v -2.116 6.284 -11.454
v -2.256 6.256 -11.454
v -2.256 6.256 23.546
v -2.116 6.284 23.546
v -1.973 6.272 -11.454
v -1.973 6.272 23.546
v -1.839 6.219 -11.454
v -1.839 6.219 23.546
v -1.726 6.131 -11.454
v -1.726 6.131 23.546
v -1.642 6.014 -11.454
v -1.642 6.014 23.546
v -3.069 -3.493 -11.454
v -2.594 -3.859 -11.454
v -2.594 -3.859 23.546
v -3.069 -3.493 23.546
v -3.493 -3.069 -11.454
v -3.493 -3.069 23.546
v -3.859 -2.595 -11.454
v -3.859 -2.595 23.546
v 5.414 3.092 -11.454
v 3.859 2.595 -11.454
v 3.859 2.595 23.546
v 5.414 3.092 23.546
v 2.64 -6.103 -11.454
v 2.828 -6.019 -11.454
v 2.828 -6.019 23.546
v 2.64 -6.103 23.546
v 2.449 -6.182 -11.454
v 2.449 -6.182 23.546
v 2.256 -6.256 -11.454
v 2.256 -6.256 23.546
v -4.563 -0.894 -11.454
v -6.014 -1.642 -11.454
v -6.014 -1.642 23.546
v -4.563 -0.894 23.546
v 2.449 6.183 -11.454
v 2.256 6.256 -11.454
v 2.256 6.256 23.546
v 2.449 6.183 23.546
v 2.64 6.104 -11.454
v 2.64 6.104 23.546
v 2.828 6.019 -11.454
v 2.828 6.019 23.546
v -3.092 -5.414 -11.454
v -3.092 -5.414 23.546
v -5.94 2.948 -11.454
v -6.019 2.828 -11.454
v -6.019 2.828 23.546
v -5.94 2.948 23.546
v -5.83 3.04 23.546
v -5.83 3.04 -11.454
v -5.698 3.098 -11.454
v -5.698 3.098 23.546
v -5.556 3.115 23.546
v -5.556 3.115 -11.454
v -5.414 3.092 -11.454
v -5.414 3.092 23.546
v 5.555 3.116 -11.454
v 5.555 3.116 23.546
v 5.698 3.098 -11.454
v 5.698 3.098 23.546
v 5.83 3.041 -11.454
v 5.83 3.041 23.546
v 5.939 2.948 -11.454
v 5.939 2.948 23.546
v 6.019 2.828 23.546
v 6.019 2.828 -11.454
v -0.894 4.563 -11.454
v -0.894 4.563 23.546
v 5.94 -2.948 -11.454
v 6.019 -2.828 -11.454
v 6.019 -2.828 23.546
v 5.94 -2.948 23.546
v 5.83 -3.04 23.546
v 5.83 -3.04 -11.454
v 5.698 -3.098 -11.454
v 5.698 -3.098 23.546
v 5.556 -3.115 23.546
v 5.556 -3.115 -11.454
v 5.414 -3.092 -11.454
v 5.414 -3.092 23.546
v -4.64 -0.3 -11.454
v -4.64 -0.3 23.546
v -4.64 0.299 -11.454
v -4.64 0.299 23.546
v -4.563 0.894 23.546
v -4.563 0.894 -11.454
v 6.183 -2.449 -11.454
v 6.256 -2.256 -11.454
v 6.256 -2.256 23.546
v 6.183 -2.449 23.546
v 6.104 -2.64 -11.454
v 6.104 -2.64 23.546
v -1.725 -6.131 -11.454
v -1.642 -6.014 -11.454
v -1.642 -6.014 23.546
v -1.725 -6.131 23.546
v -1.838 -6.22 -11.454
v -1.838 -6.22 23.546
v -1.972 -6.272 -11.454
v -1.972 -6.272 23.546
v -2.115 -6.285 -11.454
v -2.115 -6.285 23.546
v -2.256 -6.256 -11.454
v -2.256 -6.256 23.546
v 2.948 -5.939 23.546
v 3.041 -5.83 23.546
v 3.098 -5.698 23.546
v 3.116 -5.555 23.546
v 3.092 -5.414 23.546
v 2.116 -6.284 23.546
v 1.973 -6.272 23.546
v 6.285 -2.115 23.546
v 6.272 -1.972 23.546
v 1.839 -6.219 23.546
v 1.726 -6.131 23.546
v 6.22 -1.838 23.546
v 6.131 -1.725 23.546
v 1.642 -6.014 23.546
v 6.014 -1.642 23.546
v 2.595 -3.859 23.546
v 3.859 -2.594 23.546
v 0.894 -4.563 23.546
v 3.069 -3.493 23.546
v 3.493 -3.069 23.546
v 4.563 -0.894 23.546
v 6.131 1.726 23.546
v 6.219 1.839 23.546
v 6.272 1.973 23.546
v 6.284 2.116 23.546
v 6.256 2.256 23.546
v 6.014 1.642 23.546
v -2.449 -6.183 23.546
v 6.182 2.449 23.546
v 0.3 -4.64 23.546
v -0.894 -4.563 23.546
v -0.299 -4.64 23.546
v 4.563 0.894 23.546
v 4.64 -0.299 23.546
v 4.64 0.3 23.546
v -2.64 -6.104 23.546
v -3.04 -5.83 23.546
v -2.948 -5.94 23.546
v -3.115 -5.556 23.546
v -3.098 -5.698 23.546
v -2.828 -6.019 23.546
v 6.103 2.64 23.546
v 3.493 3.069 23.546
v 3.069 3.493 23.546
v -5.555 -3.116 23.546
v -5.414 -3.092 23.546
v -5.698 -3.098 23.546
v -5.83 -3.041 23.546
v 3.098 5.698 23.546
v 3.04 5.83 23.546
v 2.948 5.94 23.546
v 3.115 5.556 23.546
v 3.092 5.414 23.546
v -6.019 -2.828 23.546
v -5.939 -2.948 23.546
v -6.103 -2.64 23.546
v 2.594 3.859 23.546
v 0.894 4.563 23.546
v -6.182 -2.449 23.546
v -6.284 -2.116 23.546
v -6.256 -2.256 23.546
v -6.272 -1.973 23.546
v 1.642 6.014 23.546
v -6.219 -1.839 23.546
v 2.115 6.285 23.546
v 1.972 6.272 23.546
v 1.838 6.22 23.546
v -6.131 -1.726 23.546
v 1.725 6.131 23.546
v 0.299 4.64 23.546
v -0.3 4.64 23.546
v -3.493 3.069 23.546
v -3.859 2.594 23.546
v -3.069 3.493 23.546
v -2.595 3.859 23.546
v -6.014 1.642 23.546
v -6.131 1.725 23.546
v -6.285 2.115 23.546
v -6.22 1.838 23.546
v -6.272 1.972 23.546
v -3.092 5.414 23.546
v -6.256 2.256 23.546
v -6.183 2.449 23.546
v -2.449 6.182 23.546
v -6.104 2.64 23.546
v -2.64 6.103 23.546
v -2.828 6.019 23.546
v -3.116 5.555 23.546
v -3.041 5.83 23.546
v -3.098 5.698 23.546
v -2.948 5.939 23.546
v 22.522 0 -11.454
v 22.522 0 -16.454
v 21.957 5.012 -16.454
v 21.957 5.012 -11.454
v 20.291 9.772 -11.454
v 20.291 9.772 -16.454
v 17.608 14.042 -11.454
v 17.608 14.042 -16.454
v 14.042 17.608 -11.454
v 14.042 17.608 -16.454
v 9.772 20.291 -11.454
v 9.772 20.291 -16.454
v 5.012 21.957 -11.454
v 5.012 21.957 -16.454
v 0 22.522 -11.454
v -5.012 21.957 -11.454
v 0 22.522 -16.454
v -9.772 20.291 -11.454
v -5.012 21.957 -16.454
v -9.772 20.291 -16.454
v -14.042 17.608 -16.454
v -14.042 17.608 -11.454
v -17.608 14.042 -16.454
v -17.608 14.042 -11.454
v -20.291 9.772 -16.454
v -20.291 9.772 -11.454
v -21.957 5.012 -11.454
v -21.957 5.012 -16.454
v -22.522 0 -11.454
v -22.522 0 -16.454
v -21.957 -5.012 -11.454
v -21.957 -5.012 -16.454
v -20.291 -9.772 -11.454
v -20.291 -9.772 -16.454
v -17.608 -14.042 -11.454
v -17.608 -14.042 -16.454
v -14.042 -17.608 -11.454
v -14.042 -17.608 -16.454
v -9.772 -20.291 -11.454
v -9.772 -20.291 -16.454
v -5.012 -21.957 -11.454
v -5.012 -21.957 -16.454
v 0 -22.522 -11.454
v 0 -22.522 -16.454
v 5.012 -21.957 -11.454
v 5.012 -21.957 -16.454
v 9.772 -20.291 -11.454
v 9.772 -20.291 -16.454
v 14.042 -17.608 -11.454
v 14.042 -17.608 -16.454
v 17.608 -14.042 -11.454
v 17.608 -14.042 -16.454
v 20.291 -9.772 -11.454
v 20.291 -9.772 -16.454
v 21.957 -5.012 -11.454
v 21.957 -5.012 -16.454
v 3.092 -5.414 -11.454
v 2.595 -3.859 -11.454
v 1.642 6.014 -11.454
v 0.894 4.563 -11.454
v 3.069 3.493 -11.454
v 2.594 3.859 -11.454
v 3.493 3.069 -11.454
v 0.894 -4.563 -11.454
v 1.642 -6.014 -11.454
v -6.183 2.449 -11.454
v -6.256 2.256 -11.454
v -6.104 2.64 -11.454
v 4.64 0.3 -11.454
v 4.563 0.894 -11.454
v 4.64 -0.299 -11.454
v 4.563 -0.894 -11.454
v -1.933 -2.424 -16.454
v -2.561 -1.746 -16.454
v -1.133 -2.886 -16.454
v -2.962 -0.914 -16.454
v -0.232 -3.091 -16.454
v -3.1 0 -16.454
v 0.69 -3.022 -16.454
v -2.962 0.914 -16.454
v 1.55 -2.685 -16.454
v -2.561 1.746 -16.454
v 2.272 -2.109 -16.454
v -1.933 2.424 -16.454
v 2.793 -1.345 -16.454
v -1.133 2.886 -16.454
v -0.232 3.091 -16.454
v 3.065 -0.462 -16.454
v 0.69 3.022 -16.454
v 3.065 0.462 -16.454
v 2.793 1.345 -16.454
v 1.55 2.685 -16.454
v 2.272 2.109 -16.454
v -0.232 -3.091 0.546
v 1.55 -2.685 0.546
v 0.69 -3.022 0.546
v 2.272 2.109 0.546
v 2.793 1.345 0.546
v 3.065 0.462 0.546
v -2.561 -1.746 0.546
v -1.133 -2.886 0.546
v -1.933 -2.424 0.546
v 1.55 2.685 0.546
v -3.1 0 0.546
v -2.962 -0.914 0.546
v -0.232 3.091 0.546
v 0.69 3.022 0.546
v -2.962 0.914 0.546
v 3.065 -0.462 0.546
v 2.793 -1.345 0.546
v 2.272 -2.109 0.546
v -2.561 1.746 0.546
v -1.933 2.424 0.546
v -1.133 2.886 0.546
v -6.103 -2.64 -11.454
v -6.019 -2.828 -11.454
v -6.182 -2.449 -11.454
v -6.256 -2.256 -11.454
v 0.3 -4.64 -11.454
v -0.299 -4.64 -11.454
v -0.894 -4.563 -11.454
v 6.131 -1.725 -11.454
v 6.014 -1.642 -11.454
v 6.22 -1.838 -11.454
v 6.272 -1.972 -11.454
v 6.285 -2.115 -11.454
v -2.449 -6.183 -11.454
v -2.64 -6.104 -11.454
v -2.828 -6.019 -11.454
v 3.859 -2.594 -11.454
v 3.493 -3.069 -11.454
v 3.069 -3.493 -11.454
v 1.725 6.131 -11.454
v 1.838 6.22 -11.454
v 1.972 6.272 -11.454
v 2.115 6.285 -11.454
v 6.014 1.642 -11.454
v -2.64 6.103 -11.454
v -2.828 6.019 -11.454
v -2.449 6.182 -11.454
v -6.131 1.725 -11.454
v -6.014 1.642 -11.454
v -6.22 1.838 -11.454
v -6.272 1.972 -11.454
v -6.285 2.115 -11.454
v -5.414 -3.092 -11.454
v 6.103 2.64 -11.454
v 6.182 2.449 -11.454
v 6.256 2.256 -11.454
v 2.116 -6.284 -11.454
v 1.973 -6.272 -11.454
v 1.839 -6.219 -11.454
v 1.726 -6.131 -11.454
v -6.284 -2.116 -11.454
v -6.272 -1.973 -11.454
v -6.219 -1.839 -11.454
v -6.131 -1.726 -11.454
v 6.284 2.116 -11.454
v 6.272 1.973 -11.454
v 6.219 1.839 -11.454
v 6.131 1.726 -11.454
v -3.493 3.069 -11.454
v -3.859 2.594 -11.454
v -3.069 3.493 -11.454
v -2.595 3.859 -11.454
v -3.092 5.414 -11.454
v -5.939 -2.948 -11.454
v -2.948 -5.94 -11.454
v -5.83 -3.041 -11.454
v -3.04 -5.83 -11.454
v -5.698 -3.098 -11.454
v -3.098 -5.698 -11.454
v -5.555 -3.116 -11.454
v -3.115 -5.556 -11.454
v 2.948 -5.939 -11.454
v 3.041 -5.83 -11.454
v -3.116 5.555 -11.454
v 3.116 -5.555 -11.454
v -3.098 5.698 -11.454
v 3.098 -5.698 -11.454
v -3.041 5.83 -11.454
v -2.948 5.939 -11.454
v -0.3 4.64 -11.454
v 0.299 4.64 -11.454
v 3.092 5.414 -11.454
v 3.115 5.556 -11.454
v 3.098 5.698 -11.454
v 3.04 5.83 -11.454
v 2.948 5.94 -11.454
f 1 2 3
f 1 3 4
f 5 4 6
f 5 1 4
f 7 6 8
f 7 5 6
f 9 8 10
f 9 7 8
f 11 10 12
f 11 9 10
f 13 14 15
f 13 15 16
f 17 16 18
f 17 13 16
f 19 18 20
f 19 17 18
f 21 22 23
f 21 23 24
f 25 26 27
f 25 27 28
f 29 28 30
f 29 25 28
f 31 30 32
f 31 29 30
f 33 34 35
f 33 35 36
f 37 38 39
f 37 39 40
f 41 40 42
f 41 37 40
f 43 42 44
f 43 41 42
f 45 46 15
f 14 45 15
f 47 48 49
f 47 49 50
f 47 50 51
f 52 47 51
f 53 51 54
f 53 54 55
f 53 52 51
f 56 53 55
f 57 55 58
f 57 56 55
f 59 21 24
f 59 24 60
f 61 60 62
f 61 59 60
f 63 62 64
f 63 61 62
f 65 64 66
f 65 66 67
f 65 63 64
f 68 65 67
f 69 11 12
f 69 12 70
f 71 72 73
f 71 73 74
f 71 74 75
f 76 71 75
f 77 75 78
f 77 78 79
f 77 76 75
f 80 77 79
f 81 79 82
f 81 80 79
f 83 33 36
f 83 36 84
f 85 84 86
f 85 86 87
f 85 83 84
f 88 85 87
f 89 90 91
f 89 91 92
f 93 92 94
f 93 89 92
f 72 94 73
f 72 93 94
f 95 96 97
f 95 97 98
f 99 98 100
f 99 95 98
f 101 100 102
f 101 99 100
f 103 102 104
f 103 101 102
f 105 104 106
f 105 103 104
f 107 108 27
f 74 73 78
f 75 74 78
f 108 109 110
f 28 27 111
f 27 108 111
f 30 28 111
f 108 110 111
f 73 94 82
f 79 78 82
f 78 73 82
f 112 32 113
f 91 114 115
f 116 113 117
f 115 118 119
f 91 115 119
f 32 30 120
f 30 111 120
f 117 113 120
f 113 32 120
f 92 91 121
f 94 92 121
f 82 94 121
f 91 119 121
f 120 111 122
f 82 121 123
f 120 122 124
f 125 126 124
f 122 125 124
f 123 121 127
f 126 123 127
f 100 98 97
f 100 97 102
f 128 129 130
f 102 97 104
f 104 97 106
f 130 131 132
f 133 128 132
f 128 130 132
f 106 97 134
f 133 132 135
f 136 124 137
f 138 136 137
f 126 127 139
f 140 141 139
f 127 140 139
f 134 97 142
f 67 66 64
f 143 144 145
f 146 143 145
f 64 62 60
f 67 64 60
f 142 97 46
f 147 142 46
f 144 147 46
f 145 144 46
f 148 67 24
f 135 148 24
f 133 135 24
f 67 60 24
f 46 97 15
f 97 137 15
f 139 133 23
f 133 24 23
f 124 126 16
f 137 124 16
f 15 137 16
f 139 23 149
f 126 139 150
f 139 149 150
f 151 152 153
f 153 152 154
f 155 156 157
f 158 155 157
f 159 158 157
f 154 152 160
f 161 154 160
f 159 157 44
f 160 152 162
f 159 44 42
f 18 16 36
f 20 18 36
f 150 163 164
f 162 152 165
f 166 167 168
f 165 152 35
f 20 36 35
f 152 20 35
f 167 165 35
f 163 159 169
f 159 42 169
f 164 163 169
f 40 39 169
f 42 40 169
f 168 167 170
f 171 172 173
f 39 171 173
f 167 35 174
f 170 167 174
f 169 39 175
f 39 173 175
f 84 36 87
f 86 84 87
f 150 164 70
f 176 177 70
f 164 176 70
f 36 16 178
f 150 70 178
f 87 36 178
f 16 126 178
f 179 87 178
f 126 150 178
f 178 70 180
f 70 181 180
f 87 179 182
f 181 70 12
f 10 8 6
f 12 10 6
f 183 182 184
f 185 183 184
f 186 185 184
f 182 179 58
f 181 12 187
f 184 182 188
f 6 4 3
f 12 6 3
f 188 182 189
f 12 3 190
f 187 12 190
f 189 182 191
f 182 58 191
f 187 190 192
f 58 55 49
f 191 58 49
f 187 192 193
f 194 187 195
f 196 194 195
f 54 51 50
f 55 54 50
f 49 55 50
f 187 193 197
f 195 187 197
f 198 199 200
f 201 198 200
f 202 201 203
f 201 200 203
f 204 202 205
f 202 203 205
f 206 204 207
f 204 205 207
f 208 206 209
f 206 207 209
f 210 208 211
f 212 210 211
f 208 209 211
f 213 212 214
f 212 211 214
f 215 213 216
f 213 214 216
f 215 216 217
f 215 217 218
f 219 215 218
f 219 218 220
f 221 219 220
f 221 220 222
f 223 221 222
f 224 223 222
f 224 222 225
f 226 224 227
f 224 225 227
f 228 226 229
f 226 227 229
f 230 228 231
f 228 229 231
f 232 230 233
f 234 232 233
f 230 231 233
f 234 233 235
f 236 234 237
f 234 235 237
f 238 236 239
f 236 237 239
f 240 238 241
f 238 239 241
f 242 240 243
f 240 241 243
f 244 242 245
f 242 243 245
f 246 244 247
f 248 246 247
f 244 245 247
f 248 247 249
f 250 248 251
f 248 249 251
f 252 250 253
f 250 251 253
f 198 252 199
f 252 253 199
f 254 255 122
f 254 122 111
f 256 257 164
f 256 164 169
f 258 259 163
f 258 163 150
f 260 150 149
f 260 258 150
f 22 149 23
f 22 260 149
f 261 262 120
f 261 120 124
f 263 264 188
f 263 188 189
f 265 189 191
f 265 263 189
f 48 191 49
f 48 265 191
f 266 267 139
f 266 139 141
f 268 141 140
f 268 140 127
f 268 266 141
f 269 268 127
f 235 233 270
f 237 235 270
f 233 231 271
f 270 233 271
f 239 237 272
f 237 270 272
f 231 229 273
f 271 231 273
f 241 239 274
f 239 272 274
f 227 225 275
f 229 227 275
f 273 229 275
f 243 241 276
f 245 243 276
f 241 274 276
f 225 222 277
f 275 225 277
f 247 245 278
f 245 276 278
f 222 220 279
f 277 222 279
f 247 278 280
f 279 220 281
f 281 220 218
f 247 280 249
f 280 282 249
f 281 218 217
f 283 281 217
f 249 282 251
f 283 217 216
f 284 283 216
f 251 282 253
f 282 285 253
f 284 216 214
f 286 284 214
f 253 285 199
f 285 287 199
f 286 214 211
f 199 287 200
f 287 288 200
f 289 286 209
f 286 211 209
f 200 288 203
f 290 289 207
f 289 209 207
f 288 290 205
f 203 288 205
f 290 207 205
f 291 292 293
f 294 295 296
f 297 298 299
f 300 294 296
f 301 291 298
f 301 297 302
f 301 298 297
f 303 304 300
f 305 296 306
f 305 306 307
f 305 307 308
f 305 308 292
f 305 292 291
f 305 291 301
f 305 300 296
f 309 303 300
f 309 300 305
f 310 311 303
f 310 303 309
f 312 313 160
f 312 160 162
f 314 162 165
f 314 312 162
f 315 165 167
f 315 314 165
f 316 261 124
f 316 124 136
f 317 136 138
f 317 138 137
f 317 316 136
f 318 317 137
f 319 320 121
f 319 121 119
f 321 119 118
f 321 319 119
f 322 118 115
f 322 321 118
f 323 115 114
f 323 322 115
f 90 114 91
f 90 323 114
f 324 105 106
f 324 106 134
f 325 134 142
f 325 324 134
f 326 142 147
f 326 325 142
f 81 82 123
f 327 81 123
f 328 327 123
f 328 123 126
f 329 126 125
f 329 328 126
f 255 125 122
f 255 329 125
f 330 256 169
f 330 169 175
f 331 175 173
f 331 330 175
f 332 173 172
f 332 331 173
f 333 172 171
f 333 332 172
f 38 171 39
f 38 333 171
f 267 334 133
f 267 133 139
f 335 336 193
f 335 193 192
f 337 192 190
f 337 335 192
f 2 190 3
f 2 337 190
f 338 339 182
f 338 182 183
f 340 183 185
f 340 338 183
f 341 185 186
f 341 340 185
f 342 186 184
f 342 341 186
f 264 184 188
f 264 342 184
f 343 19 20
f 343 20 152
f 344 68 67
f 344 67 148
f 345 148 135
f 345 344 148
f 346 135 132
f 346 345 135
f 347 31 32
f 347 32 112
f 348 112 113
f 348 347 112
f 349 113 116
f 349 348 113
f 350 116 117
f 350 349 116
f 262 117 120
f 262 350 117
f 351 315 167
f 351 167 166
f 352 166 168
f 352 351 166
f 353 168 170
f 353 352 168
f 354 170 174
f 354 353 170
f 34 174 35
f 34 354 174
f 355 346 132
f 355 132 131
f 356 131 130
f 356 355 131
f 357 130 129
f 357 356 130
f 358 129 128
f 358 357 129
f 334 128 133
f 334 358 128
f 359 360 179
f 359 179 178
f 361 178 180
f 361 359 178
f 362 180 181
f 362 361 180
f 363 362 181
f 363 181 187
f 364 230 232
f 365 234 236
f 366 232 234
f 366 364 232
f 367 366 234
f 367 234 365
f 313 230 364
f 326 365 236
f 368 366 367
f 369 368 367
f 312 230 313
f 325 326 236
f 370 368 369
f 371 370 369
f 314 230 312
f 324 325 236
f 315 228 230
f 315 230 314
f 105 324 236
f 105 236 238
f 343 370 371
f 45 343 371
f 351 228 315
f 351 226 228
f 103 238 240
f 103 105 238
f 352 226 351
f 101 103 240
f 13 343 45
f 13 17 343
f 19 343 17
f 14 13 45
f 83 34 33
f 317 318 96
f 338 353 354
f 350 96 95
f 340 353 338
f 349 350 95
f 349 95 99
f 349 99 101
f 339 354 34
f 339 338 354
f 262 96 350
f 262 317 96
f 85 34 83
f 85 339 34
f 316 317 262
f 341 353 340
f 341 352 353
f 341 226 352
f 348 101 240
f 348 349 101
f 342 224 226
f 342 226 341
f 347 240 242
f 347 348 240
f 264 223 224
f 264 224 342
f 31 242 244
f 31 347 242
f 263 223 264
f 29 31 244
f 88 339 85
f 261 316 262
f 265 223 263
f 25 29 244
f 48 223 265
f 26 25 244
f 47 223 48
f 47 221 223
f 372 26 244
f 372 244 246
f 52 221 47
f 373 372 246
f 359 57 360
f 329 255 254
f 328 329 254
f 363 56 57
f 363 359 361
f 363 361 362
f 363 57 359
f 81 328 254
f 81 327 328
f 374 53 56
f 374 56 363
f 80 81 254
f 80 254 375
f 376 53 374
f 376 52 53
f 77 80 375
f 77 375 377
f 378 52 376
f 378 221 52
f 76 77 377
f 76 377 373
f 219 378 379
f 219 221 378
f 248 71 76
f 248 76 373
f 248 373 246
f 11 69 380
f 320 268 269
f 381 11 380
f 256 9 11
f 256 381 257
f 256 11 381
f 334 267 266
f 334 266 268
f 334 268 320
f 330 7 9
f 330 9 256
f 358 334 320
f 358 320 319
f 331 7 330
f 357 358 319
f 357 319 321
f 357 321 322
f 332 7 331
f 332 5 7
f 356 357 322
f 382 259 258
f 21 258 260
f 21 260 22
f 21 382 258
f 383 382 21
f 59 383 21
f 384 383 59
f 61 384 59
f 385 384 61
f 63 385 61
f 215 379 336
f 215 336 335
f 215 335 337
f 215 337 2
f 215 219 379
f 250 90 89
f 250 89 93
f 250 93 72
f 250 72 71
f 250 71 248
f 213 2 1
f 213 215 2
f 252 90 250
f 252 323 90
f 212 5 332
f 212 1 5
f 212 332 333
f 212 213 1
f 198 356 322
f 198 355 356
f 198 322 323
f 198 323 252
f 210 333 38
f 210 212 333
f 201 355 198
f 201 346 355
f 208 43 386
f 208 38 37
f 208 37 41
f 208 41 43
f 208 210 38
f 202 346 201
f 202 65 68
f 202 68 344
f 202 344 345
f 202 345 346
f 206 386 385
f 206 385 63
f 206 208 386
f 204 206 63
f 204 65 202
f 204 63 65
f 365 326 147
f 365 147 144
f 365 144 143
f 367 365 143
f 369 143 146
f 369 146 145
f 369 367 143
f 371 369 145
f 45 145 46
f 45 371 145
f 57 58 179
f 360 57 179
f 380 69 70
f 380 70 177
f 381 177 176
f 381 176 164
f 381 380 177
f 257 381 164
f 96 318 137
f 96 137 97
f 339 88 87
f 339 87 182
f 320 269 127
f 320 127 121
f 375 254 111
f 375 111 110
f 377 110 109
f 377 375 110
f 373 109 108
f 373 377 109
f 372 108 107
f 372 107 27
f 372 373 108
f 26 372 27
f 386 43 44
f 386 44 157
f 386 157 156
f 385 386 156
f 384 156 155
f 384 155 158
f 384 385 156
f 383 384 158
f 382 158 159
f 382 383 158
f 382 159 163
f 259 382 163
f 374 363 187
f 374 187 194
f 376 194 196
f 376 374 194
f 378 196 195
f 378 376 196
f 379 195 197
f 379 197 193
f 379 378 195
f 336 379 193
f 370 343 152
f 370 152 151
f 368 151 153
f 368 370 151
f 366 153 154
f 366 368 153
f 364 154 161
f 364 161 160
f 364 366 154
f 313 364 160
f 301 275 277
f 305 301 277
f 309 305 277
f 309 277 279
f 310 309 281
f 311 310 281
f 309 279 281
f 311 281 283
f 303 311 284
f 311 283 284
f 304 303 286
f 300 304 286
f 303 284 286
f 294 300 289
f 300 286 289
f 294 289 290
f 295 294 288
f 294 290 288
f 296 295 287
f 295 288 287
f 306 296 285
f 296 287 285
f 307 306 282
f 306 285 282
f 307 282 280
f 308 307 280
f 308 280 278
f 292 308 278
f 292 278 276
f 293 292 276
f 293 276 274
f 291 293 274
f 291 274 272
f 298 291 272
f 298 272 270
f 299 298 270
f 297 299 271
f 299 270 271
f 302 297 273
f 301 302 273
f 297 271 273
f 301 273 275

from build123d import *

# Parameters (mm, degrees)
SKETCH2_R           = 4.137132353
BOSS_EXTRUDE1_DEPTH = 40
SKETCH2_4_R         = 22.521813525
BOSS_EXTRUDE2_DEPTH = 5
BOSS_EXTRUDE3_DEPTH = 35
SKETCH6_R           = 3.1
CUT_EXTRUDE1_DEPTH  = 17


with BuildPart() as part:
    # Sketch2 → Boss-Extrude1 (new body)
    with BuildSketch(Plane.XY.offset(-16.453858319)):
        Circle(SKETCH2_R)
    extrude(amount=BOSS_EXTRUDE1_DEPTH)

    # Sketch2<4> → Boss-Extrude2 (add)
    with BuildSketch(Plane.XY.offset(-16.453858319)):
        Circle(SKETCH2_4_R)
    extrude(amount=BOSS_EXTRUDE2_DEPTH)

    # Sketch5 → Boss-Extrude3 (add)
    with BuildSketch(Plane.XY.offset(-11.453858319)):
        with BuildLine():
            Line((3.09152076, 5.413957434), (2.594362934, 3.858987039))
            ThreePointArc((2.594362934, 3.858987039), (3.287908356, 3.288184703), (3.85876898, 2.594687257))
            Line((3.85876898, 2.594687257), (5.413697585, 3.091975771))
            ThreePointArc((5.413697585, 3.091975771), (5.765755257, 3.074104639), (6.018526007, 2.828399672))
            ThreePointArc((6.018526007, 2.828399672), (6.143691944, 2.545103004), (6.25553153, 2.256285725))
            ThreePointArc((6.25553153, 2.256285725), (6.250564892, 1.903809747), (6.014281308, 1.642210721))
            Line((6.014281308, 1.642210721), (4.563207527, 0.894224281))
            ThreePointArc((4.563207527, 0.894224281), (4.649999996, 0.000195407), (4.563282667, -0.893840758))
            Line((4.563282667, -0.893840758), (6.014419308, -1.641705239))
            ThreePointArc((6.014419308, -1.641705239), (6.250724877, -1.903284405), (6.25572114, -2.255759964))
            ThreePointArc((6.25572114, -2.255759964), (6.143905828, -2.544586642), (6.018763701, -2.827893829))
            ThreePointArc((6.018763701, -2.827893829), (5.766013604, -3.073620039), (5.413957434, -3.09152076))
            Line((5.413957434, -3.09152076), (3.858987039, -2.594362934))
            ThreePointArc((3.858987039, -2.594362934), (3.288184703, -3.287908356), (2.594687257, -3.85876898))
            Line((2.594687257, -3.85876898), (3.091975771, -5.413697585))
            ThreePointArc((3.091975771, -5.413697585), (3.074104639, -5.765755257), (2.828399672, -6.018526007))
            ThreePointArc((2.828399672, -6.018526007), (2.545103004, -6.143691944), (2.256285725, -6.25553153))
            ThreePointArc((2.256285725, -6.25553153), (1.903809747, -6.250564892), (1.642210721, -6.014281308))
            Line((1.642210721, -6.014281308), (0.894224281, -4.563207527))
            ThreePointArc((0.894224281, -4.563207527), (0.000195407, -4.649999996), (-0.893840758, -4.563282667))
            Line((-0.893840758, -4.563282667), (-1.641705239, -6.014419308))
            ThreePointArc((-1.641705239, -6.014419308), (-1.903284405, -6.250724877), (-2.255759964, -6.25572114))
            ThreePointArc((-2.255759964, -6.25572114), (-2.544586642, -6.143905828), (-2.827893829, -6.018763701))
            ThreePointArc((-2.827893829, -6.018763701), (-3.073620039, -5.766013604), (-3.09152076, -5.413957434))
            Line((-3.09152076, -5.413957434), (-2.594362934, -3.858987039))
            ThreePointArc((-2.594362934, -3.858987039), (-3.287908356, -3.288184703), (-3.85876898, -2.594687257))
            Line((-3.85876898, -2.594687257), (-5.413697585, -3.091975771))
            ThreePointArc((-5.413697585, -3.091975771), (-5.765755257, -3.074104639), (-6.018526007, -2.828399672))
            ThreePointArc((-6.018526007, -2.828399672), (-6.143691944, -2.545103004), (-6.25553153, -2.256285725))
            ThreePointArc((-6.25553153, -2.256285725), (-6.250564892, -1.903809747), (-6.014281308, -1.642210721))
            Line((-6.014281308, -1.642210721), (-4.563207527, -0.894224281))
            ThreePointArc((-4.563207527, -0.894224281), (-4.649999996, -0.000195407), (-4.563282667, 0.893840758))
            Line((-4.563282667, 0.893840758), (-6.014419308, 1.641705239))
            ThreePointArc((-6.014419308, 1.641705239), (-6.250724877, 1.903284405), (-6.25572114, 2.255759964))
            ThreePointArc((-6.25572114, 2.255759964), (-6.143905828, 2.544586642), (-6.018763701, 2.827893829))
            ThreePointArc((-6.018763701, 2.827893829), (-5.766013604, 3.073620039), (-5.413957434, 3.09152076))
            Line((-5.413957434, 3.09152076), (-3.858987039, 2.594362934))
            ThreePointArc((-3.858987039, 2.594362934), (-3.288184703, 3.287908356), (-2.594687257, 3.85876898))
            Line((-2.594687257, 3.85876898), (-3.091975771, 5.413697585))
            ThreePointArc((-3.091975771, 5.413697585), (-3.074104639, 5.765755257), (-2.828399672, 6.018526007))
            ThreePointArc((-2.828399672, 6.018526007), (-2.545103004, 6.143691944), (-2.256285725, 6.25553153))
            ThreePointArc((-2.256285725, 6.25553153), (-1.903809747, 6.250564892), (-1.642210721, 6.014281308))
            Line((-1.642210721, 6.014281308), (-0.894224281, 4.563207527))
            ThreePointArc((-0.894224281, 4.563207527), (-0.000195407, 4.649999996), (0.893840758, 4.563282667))
            Line((0.893840758, 4.563282667), (1.641705239, 6.014419308))
            ThreePointArc((1.641705239, 6.014419308), (1.903284405, 6.250724877), (2.255759964, 6.25572114))
            ThreePointArc((2.255759964, 6.25572114), (2.544586642, 6.143905828), (2.827893829, 6.018763701))
            ThreePointArc((2.827893829, 6.018763701), (3.073620039, 5.766013604), (3.09152076, 5.413957434))
        make_face()
    extrude(amount=BOSS_EXTRUDE3_DEPTH)

    # Sketch6 → Cut-Extrude1 (cut)
    with BuildSketch(Plane(origin=(0, 0, -16.453858319), x_dir=(-1, 0, 0), z_dir=(0, 0, -1))):
        Circle(SKETCH6_R)
    extrude(amount=-CUT_EXTRUDE1_DEPTH, mode=Mode.SUBTRACT)


solid = part.part
